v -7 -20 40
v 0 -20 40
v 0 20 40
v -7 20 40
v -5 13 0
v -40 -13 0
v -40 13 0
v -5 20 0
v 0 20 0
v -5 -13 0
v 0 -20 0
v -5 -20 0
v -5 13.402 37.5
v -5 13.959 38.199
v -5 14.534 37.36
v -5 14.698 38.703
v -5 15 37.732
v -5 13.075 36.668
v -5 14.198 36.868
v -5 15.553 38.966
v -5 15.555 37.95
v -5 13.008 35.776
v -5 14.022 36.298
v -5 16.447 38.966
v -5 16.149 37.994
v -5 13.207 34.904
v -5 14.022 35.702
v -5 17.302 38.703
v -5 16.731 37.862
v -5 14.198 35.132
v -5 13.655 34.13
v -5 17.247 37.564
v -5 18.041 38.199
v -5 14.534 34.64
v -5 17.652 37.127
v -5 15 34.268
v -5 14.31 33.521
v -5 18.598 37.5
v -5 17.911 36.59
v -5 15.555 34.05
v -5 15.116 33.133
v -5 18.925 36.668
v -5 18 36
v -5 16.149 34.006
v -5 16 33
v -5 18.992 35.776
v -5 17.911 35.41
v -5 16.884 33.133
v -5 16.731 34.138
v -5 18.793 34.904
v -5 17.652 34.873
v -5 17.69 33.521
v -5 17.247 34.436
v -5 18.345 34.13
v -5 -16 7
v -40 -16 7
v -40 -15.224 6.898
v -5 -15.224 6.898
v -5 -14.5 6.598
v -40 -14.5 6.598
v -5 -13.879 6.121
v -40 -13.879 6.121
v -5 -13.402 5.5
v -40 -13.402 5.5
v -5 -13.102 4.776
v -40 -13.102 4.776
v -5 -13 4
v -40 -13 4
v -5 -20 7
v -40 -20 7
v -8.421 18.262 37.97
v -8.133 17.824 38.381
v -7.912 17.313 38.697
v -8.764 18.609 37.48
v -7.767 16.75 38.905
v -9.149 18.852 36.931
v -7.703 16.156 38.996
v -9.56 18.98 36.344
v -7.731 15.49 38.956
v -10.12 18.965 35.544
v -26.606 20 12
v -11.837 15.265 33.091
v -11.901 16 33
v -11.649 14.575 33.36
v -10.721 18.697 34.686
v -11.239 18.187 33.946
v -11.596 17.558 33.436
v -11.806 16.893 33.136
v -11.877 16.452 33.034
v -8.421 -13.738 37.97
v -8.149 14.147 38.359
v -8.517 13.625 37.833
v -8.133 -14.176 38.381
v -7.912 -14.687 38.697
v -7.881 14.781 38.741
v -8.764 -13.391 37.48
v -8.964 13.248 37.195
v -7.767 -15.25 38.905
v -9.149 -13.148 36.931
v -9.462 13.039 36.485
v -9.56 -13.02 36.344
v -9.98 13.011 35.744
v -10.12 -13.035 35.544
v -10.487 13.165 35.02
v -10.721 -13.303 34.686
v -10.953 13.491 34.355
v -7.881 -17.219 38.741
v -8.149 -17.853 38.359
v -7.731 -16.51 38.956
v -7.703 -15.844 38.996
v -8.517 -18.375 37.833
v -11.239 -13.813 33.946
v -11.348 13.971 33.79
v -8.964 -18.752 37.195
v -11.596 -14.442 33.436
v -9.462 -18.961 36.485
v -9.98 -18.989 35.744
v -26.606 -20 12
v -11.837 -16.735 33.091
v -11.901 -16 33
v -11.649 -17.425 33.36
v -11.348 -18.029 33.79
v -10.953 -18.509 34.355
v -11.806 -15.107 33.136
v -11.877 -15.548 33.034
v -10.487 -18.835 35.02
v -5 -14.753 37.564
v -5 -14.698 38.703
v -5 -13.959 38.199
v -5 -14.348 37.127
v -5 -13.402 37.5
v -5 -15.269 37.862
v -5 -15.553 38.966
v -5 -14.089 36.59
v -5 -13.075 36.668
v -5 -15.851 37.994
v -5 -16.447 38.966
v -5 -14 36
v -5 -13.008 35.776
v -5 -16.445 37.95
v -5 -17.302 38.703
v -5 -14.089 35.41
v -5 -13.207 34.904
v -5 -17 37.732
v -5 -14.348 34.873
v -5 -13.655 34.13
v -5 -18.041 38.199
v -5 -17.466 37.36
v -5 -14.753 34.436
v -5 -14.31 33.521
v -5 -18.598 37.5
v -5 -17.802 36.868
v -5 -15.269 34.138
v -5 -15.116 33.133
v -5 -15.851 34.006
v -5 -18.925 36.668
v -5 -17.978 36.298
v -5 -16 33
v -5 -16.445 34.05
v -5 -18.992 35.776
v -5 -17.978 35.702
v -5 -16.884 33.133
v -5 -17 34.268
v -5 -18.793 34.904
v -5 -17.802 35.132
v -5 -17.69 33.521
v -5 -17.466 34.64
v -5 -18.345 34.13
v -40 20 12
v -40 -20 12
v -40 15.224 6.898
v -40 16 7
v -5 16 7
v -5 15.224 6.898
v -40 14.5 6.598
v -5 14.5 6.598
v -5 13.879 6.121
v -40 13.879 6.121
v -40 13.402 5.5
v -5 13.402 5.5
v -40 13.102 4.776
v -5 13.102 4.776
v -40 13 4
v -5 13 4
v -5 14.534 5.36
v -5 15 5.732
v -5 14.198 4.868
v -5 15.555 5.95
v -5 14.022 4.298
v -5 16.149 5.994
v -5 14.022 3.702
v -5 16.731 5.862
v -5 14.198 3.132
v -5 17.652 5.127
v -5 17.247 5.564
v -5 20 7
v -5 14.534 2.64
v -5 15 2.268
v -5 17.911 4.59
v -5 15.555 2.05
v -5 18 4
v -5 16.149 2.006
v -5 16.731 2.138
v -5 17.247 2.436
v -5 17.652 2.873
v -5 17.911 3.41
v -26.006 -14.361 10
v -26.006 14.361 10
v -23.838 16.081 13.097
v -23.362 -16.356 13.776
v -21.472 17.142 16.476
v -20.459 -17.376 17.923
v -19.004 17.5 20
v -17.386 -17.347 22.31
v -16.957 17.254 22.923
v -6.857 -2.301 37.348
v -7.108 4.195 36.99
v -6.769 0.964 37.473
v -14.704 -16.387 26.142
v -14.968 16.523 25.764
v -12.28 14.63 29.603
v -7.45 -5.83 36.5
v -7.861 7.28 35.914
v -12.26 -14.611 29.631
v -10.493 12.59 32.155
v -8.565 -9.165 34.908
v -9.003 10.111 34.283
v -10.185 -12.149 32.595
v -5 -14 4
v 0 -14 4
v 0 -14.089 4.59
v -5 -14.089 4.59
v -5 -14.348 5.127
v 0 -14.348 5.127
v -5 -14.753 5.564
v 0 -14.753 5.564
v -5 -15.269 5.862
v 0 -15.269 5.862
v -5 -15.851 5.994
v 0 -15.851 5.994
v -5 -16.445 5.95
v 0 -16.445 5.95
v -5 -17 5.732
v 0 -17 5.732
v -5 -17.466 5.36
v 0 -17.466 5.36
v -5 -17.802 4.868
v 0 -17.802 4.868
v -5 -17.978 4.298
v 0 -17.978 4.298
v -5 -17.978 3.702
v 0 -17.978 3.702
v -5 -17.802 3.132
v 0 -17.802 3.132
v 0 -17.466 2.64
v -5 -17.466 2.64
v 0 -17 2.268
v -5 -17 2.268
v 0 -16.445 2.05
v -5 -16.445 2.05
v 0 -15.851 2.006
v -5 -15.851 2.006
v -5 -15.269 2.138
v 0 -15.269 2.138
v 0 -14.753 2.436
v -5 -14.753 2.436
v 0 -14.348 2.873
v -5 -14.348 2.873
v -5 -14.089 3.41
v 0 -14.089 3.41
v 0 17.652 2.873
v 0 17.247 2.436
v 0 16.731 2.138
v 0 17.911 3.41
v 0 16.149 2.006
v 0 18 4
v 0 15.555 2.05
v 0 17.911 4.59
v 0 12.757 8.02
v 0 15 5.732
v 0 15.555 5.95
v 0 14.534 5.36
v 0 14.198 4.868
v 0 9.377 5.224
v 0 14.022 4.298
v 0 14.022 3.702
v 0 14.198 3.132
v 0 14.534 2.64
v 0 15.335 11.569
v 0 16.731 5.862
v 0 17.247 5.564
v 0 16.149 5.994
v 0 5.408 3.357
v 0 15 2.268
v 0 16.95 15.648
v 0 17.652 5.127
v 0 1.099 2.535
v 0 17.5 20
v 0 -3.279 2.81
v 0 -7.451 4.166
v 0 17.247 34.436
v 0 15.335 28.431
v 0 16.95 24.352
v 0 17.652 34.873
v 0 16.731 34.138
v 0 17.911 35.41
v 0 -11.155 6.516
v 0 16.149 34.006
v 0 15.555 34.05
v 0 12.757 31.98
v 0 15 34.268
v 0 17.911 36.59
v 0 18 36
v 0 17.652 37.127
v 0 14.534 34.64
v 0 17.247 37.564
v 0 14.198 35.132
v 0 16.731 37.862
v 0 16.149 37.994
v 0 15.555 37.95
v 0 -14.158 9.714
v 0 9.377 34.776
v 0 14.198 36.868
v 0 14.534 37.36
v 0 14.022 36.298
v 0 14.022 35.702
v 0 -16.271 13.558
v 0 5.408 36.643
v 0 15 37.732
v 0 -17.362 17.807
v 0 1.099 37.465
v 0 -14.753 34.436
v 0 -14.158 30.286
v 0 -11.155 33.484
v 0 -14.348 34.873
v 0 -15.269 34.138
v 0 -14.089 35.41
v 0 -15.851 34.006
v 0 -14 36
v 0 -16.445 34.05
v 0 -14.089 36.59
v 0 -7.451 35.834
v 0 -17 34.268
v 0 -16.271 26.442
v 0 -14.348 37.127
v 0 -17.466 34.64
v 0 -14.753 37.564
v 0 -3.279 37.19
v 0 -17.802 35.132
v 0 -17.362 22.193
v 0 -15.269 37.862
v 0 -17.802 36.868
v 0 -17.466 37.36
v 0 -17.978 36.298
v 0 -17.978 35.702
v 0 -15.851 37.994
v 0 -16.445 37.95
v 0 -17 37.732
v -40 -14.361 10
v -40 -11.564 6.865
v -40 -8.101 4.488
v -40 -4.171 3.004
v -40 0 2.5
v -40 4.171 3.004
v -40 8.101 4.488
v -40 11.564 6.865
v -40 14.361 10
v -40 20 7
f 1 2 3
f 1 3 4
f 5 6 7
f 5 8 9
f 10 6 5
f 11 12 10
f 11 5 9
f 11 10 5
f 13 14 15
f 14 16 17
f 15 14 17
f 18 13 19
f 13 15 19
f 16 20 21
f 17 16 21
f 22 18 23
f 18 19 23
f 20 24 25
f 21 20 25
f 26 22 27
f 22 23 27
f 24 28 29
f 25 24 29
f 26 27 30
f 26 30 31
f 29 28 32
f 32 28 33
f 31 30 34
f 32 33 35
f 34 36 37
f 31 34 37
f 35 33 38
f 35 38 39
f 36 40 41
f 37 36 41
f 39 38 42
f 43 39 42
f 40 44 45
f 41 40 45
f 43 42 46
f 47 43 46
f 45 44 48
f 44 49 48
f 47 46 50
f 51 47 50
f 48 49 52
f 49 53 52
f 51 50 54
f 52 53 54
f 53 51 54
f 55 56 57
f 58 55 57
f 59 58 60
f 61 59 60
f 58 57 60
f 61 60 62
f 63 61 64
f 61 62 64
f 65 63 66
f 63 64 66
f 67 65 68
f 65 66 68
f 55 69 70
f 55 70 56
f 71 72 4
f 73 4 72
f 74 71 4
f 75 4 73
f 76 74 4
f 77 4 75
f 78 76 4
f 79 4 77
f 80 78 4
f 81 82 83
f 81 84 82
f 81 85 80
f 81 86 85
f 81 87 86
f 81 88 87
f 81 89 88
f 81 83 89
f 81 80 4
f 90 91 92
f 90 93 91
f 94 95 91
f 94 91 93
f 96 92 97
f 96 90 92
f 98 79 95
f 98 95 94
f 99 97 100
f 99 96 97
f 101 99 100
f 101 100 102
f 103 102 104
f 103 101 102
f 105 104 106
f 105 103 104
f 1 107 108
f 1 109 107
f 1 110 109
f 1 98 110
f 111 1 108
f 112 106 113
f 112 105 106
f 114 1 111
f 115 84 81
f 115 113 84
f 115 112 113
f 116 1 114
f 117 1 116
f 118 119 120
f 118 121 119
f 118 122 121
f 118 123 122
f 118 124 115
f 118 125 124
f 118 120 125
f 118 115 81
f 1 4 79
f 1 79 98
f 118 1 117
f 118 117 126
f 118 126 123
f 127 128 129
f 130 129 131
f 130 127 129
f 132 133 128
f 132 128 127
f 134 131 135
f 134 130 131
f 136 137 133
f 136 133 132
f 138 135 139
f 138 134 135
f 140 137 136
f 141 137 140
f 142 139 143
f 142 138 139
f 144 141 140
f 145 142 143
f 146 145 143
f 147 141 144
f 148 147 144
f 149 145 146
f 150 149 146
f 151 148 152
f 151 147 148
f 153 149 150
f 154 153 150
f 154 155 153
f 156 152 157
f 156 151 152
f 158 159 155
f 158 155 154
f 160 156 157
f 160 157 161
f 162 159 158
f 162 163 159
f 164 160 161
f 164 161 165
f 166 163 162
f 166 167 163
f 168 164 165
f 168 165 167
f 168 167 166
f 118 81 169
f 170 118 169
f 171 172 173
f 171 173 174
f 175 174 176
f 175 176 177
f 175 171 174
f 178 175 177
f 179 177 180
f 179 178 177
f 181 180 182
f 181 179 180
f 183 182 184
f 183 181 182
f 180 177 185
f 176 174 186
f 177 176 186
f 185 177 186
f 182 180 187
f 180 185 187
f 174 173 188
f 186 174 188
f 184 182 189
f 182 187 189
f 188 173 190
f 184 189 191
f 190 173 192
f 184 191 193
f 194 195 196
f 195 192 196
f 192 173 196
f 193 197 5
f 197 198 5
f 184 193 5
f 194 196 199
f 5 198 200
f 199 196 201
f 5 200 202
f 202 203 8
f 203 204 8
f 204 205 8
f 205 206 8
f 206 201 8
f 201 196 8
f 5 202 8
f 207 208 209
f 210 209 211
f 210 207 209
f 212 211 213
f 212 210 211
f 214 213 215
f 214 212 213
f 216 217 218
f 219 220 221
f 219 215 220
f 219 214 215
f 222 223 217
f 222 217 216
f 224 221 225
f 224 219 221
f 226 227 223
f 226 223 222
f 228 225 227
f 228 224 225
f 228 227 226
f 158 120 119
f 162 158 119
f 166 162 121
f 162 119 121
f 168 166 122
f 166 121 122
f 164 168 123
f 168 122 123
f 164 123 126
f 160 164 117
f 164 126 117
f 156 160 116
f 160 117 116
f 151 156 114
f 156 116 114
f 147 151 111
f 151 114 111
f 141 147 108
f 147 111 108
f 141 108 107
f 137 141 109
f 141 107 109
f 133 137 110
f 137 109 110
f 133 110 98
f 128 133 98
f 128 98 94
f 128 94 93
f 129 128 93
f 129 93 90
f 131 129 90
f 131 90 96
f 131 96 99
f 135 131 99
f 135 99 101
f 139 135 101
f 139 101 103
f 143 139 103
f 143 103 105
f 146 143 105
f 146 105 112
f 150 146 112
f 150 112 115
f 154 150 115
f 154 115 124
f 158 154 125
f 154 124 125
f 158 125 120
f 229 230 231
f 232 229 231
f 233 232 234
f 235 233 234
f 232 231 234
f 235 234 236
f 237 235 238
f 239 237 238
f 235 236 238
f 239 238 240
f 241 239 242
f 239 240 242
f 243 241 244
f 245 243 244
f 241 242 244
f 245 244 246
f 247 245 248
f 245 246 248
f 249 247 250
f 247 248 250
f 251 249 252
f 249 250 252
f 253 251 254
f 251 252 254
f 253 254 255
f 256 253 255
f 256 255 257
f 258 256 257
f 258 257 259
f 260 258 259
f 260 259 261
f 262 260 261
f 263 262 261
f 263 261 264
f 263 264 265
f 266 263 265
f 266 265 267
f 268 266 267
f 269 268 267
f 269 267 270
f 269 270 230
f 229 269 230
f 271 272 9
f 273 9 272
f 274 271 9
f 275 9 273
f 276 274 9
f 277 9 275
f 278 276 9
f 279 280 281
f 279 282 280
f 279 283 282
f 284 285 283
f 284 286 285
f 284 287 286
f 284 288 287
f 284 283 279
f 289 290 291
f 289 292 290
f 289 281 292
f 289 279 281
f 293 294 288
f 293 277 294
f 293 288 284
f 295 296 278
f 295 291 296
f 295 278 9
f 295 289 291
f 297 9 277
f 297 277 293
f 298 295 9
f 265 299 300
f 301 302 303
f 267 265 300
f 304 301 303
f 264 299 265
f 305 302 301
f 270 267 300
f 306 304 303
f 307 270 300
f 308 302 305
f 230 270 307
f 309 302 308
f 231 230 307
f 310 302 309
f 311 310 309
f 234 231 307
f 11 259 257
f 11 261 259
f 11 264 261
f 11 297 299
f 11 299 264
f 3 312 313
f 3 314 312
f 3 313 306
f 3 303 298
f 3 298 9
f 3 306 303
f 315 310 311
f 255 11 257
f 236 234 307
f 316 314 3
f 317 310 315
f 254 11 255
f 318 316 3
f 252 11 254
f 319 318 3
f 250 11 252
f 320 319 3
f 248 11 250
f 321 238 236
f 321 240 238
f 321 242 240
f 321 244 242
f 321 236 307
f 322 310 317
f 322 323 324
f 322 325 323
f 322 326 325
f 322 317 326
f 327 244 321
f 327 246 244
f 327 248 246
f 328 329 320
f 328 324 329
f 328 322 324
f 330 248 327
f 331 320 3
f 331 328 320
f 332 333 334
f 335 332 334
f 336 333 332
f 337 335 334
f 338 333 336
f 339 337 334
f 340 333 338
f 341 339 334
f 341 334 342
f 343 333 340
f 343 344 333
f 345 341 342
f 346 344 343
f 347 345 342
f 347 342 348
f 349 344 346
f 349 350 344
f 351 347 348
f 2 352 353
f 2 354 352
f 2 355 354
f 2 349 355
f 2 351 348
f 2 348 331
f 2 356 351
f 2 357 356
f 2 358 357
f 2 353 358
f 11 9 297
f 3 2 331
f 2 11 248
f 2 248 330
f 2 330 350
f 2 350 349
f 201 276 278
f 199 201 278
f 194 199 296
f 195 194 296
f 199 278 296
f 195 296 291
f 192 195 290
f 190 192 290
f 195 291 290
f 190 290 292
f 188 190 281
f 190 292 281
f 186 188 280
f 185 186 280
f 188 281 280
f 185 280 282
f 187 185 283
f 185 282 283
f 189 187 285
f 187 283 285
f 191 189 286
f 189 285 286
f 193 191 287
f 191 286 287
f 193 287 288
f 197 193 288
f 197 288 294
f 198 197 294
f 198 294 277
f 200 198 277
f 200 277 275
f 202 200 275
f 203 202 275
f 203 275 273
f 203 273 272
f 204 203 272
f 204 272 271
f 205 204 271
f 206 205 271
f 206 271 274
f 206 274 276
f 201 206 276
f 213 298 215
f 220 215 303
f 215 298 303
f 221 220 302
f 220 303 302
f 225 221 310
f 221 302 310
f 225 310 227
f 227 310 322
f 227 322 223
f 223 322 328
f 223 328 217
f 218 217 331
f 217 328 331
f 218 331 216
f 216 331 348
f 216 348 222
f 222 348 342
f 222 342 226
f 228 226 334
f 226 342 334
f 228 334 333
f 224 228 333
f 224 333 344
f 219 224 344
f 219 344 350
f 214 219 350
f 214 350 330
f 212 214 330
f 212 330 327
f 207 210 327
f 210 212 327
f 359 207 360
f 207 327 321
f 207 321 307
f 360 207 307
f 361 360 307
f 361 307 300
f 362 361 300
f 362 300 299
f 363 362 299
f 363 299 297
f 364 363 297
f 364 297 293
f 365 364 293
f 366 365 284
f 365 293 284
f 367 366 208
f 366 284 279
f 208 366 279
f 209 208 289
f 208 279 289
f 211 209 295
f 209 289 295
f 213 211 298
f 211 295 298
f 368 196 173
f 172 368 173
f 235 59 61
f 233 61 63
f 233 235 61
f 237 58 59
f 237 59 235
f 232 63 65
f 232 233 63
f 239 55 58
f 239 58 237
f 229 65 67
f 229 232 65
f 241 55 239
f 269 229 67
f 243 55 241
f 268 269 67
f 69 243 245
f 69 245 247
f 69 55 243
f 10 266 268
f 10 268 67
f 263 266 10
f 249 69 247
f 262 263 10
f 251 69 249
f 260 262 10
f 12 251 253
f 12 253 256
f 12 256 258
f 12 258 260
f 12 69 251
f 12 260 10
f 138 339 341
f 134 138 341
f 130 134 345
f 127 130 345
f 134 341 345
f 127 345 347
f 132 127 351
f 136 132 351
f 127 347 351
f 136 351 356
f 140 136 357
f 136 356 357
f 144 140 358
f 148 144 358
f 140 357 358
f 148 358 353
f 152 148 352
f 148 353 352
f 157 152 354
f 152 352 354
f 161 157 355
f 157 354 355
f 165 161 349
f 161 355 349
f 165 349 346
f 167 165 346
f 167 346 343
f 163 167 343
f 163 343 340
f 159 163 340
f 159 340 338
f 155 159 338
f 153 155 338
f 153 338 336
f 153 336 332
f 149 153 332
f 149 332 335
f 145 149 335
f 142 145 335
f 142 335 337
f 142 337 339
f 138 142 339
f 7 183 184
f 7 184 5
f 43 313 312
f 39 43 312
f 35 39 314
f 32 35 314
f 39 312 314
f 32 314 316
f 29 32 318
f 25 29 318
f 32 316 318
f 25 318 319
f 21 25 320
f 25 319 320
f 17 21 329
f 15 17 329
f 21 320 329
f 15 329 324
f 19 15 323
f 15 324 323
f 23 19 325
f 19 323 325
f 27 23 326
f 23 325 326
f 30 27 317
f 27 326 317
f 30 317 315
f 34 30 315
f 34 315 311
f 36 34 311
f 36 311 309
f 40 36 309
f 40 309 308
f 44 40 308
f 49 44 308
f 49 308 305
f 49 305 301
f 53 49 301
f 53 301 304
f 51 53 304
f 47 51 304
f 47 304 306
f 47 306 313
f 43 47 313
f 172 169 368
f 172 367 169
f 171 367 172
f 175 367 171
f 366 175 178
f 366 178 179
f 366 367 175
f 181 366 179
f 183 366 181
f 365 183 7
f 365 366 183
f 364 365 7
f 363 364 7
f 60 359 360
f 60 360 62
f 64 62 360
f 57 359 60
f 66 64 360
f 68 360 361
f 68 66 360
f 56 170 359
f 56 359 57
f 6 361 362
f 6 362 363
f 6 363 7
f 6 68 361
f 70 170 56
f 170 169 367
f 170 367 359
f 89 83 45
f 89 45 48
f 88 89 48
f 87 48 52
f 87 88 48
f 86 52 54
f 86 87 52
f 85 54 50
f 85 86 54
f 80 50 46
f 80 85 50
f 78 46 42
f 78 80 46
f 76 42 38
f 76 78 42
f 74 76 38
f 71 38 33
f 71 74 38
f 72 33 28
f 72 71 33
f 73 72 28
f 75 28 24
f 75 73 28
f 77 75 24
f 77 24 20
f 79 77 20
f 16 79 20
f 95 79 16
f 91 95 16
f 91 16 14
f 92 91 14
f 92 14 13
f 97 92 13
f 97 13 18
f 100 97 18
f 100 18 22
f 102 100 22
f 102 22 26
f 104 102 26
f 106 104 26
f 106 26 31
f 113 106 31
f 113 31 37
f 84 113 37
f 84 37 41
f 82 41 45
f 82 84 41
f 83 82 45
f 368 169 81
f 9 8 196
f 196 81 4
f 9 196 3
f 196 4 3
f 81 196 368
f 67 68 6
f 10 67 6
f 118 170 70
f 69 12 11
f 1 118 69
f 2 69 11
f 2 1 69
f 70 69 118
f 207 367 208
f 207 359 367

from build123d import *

# Parameters (mm, degrees)
PAD_DEPTH       = 20
SKETCH001_R     = 17.5
POCKET_DEPTH    = 40.001
PAD001_DEPTH    = 20
SKETCH003_R     = 3
POCKET001_DEPTH = 35
SKETCH004_R     = 2
POCKET002_DEPTH = 40.001


with BuildPart() as part:
    # Sketch → Pad (new body, symmetric)
    with BuildSketch(Plane.XZ):
        Polygon((-40, 0), (0, 0), (0, 40), (-5, 40), (-26.006226, 10), (-40, 10), align=None)
    extrude(amount=PAD_DEPTH, both=True)

    # Sketch001 → Pocket (cut, through all)
    with BuildSketch(Plane.YZ):
        with Locations((0, 20)):
            Circle(SKETCH001_R)
    extrude(amount=-POCKET_DEPTH, mode=Mode.SUBTRACT)

    # Sketch002 → Pad001 (join, symmetric)
    with BuildSketch(Plane.XZ):
        Polygon((-5, 40), (-7, 40), (-26.605811, 12), (-40, 12), (-40, 10), (-26.006226, 10), align=None)
    extrude(amount=PAD001_DEPTH, both=True)

    # Sketch003 (on Face6 of Pad001) → Pocket001 (cut)
    with BuildSketch(Plane(origin=(-40, 0, 0), x_dir=(0, 0, -1), z_dir=(-1, 0, 0))):
        with Locations((-36, 16)):
            Circle(SKETCH003_R)
        with BuildLine():
            Line((-4, 13), (4.613364, 13))
            Line((4.613364, 13), (4.613364, 24.650373))
            Line((4.613364, 24.650373), (-7, 24.650373))
            Line((-7, 24.650373), (-7, 16))
            ThreePointArc((-7, 16), (-6.12132, 13.87868), (-4, 13))
        make_face()
    pocket001 = extrude(amount=-POCKET001_DEPTH, mode=Mode.SUBTRACT)

    # Mirrored: Pocket001 across XZ
    add(pocket001.mirror(Plane.XZ), mode=Mode.SUBTRACT)

    # Sketch004 → Pocket002 (cut, through all)
    with BuildSketch(Plane.YZ):
        with Locations((16, 36)):
            Circle(SKETCH004_R)
        with Locations((16, 4)):
            Circle(SKETCH004_R)
        with Locations((-16, 4)):
            Circle(SKETCH004_R)
        with Locations((-16, 36)):
            Circle(SKETCH004_R)
    extrude(amount=-POCKET002_DEPTH, mode=Mode.SUBTRACT)


solid = part.part
